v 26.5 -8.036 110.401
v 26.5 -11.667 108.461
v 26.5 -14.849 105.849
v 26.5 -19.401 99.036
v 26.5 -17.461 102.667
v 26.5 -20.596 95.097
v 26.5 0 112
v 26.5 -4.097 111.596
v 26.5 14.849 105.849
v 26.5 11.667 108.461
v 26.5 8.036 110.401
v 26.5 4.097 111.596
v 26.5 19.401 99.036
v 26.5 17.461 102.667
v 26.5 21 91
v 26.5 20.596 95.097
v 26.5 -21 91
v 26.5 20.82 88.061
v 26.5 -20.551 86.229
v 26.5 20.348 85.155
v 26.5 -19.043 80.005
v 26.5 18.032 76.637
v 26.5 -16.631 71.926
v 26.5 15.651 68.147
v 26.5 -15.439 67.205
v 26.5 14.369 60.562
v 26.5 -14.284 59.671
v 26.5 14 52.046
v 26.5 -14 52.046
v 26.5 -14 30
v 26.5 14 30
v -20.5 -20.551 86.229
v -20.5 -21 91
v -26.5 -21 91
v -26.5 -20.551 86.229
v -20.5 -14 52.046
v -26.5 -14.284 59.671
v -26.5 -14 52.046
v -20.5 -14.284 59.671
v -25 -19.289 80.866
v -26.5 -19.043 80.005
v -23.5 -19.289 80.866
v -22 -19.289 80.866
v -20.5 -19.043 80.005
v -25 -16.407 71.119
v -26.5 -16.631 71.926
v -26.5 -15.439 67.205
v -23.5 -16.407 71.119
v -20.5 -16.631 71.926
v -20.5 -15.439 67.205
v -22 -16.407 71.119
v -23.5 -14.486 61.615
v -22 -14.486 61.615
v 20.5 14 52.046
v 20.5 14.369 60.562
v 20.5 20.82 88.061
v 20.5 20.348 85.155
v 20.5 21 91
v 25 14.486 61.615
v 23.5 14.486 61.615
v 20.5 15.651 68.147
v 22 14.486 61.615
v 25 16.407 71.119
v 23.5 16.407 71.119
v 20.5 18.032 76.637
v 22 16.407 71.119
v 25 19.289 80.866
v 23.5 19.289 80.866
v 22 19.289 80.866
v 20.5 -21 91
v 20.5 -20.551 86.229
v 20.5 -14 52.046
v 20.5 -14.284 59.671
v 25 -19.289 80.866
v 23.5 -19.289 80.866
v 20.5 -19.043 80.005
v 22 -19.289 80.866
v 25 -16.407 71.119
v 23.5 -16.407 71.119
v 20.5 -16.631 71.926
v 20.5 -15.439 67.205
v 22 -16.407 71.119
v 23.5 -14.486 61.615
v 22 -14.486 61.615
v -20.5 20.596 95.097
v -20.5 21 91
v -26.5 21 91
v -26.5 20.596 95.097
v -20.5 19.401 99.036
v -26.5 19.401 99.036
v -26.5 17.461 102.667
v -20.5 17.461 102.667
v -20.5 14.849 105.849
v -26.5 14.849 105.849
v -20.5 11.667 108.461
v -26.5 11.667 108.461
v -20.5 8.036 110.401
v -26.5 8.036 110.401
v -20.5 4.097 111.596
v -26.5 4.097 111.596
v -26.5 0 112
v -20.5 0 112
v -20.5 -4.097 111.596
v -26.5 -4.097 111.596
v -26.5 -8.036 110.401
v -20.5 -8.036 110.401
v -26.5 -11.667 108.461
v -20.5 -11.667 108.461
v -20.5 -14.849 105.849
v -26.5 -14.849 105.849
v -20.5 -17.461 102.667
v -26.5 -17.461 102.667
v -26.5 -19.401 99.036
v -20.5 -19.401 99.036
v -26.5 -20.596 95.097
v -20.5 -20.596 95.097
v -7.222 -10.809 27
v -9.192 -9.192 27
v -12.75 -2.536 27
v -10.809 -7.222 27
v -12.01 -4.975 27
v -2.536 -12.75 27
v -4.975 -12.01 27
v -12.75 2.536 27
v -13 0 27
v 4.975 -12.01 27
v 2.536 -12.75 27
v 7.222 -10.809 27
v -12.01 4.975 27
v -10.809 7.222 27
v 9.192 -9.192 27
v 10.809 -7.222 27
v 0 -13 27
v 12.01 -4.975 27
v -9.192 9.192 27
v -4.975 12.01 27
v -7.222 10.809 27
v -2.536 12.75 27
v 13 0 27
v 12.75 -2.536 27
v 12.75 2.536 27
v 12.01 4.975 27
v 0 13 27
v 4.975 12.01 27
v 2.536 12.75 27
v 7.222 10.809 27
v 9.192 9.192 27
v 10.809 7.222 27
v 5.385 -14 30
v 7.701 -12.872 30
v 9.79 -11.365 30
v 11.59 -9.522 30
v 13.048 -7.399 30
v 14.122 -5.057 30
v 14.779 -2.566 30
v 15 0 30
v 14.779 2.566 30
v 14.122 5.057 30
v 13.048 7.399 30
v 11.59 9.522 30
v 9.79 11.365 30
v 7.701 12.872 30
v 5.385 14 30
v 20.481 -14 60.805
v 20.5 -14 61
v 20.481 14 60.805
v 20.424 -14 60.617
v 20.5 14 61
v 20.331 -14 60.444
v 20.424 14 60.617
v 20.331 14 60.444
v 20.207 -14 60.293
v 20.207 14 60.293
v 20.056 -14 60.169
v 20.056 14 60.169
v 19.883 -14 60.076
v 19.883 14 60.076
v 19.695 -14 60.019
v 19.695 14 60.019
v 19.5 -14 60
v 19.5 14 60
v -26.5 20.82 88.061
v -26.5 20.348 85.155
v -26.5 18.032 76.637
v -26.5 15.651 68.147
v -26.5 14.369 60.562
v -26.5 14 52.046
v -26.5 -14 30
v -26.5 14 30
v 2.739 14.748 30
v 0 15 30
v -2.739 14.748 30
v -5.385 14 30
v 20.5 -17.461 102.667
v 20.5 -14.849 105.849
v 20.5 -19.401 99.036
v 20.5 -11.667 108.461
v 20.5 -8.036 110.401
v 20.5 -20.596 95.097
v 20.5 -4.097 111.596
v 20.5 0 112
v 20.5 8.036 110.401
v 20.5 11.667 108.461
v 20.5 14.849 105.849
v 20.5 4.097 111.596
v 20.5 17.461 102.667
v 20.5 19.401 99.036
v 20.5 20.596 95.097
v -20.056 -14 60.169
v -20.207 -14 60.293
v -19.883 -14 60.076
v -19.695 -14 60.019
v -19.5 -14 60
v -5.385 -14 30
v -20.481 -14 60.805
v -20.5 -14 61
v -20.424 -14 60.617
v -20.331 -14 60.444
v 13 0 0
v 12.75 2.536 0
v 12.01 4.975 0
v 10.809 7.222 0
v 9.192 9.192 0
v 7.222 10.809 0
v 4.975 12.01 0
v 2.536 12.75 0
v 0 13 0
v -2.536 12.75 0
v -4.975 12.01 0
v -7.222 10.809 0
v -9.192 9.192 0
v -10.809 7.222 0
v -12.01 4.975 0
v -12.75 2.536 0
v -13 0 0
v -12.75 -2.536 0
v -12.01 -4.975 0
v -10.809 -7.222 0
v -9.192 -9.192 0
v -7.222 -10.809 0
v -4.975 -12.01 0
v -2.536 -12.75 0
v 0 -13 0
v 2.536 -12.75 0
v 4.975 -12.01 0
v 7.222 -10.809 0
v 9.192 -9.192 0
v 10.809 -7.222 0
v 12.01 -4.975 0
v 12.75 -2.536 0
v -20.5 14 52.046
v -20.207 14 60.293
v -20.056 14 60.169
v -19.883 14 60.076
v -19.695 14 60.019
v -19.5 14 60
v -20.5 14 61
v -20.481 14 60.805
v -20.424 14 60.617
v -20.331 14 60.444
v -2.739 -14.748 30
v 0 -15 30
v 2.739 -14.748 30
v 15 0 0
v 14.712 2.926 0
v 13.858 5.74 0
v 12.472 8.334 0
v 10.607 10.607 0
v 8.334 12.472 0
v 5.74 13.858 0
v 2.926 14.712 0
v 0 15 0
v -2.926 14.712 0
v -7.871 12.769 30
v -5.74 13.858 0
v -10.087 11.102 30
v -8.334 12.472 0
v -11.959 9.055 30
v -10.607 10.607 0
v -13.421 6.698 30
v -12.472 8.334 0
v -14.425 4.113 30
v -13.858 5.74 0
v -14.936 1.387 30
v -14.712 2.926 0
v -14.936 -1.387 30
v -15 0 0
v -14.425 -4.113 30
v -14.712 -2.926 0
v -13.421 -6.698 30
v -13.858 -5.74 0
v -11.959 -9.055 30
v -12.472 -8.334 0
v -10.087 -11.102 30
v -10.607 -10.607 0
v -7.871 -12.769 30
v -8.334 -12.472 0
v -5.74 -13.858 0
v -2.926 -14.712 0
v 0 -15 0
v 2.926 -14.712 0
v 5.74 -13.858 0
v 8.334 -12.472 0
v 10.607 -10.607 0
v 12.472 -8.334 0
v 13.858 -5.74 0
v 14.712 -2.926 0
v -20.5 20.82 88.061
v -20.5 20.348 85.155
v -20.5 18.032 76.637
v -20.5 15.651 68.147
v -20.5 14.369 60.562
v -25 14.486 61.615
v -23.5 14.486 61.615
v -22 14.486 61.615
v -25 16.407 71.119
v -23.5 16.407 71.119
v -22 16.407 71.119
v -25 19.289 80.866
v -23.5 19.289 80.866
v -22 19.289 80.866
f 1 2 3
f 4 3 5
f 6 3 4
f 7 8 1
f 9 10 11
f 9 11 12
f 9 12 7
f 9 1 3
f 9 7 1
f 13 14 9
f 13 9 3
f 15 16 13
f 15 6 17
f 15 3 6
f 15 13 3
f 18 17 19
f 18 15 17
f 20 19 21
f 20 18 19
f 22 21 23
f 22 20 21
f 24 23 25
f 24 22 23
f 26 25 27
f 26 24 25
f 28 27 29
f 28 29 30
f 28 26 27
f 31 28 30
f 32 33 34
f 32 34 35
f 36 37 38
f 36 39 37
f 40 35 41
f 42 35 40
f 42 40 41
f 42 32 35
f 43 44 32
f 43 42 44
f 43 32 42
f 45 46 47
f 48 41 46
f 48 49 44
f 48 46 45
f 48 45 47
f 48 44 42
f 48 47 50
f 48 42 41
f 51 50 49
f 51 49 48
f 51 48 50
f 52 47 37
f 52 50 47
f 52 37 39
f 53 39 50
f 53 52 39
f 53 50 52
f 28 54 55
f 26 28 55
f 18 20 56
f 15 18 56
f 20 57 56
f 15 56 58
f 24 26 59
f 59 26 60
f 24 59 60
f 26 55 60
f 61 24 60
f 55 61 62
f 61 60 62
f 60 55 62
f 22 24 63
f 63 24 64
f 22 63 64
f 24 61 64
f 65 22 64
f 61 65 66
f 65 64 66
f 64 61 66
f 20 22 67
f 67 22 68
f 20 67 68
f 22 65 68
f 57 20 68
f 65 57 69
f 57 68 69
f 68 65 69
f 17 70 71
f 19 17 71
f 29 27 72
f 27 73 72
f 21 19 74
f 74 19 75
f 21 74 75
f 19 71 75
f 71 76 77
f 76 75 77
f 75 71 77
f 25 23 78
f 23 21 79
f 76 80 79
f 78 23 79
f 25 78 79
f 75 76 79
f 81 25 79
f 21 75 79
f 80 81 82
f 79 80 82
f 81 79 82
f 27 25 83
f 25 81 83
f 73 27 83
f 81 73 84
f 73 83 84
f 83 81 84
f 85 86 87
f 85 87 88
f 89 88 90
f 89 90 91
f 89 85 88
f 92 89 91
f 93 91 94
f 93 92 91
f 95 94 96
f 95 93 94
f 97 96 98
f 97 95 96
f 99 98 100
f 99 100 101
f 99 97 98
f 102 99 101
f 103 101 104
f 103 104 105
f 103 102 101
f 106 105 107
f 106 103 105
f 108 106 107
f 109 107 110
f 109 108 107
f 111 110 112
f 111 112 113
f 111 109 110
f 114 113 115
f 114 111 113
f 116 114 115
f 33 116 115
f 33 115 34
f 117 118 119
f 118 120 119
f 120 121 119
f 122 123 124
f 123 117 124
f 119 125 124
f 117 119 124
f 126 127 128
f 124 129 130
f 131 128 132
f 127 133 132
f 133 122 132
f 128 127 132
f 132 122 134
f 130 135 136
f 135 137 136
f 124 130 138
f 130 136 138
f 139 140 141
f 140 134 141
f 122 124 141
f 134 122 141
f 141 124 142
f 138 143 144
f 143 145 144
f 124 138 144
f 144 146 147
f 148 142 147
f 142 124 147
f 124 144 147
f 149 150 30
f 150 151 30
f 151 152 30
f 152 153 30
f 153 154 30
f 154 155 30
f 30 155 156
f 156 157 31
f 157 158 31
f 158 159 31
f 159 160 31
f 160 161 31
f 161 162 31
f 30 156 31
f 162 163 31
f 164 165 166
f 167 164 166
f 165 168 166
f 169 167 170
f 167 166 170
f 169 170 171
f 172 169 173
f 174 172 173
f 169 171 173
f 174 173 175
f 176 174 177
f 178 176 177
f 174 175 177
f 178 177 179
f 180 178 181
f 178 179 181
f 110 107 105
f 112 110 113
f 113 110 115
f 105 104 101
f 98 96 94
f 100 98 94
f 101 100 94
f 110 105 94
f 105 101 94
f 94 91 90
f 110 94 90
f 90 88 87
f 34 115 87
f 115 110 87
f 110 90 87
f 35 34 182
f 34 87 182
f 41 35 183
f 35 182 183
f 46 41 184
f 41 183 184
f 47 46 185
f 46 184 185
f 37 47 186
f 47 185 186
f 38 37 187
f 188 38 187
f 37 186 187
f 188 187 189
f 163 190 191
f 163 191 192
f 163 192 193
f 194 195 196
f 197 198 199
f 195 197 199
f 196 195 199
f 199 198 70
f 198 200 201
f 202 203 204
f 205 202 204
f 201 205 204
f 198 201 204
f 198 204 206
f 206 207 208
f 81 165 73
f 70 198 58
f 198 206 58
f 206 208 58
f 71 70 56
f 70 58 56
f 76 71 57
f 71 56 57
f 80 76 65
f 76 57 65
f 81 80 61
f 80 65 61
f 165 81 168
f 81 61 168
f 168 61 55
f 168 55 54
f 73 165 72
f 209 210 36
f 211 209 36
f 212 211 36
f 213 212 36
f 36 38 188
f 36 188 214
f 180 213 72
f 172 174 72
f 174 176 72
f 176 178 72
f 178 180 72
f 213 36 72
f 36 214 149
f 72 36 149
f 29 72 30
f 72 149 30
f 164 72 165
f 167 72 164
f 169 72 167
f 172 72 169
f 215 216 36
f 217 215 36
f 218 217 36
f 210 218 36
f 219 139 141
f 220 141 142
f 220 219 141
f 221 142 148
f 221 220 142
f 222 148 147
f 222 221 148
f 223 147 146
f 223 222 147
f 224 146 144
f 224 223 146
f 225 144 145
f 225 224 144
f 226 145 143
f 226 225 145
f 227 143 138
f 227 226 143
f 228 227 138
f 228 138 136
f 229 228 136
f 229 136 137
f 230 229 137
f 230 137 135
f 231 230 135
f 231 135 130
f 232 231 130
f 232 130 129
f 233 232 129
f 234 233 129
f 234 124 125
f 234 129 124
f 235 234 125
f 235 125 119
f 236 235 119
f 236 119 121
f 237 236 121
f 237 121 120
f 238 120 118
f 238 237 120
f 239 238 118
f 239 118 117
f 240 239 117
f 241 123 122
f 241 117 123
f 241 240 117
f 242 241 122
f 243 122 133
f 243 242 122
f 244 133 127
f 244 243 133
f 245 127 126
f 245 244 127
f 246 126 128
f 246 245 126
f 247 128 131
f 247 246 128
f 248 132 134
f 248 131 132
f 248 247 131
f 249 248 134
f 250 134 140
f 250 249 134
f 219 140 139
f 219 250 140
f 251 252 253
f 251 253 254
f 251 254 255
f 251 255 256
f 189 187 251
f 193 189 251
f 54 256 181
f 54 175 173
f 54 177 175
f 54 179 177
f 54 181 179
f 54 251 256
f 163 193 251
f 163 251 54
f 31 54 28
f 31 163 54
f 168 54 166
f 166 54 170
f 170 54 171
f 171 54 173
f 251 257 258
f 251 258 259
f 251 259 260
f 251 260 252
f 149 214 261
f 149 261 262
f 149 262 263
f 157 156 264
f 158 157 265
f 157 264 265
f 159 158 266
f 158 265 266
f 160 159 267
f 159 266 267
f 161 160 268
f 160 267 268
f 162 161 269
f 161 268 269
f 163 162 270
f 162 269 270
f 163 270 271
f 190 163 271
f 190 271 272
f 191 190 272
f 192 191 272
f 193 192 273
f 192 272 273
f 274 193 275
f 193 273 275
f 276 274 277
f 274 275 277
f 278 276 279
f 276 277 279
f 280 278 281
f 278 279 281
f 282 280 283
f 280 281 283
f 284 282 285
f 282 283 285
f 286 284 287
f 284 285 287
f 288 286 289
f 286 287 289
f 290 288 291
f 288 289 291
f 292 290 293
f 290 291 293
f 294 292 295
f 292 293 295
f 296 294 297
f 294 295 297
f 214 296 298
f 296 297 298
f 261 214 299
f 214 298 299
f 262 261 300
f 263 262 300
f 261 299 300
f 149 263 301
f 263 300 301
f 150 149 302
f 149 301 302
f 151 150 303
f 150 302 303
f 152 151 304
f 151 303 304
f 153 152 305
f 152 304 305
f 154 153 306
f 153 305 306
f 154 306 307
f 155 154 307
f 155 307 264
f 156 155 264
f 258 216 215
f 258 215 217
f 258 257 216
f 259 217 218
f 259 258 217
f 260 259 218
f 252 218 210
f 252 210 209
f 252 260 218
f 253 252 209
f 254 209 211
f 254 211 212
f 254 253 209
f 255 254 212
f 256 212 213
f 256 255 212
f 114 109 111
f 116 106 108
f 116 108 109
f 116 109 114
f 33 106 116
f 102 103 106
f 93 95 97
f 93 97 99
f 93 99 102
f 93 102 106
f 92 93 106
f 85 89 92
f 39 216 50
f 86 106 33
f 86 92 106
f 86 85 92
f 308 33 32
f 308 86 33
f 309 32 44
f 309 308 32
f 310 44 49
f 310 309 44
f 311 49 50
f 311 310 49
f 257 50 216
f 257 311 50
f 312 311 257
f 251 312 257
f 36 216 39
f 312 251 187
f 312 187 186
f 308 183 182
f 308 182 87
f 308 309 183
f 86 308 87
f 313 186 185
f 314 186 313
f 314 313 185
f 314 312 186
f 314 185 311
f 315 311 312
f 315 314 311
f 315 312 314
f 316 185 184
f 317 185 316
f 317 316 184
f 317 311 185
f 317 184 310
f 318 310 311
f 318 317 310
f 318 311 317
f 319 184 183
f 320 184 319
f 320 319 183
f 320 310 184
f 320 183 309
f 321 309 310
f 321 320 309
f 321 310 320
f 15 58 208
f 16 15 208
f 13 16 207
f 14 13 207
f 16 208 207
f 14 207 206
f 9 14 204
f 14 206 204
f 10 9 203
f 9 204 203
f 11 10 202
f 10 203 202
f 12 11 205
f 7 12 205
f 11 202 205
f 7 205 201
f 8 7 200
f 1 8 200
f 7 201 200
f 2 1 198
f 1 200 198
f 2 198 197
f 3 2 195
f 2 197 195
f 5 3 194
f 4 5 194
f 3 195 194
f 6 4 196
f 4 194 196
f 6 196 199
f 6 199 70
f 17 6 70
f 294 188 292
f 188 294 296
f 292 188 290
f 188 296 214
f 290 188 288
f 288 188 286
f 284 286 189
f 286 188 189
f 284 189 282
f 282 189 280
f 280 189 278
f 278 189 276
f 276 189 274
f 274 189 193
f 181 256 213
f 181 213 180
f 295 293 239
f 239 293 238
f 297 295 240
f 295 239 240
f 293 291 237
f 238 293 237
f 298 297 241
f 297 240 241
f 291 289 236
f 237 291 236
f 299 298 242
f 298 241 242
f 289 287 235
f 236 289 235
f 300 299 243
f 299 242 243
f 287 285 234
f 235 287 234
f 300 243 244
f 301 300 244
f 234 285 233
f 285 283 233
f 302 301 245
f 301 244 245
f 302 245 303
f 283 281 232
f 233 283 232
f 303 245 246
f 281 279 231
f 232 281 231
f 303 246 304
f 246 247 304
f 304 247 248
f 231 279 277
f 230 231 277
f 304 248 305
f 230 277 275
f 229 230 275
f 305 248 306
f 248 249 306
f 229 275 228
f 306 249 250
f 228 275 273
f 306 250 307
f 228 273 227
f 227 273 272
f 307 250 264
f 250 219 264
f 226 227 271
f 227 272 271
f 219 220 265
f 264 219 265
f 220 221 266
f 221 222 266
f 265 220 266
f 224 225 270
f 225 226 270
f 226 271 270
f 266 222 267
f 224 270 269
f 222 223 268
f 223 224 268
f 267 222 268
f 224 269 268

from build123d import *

# Parameters (mm, degrees)
SKETCH1_R           = 15
SKETCH1_R_2         = 13
BOSS_EXTRUDE1_DEPTH = 30
BOSS_EXTRUDE2_START = -3
SKETCH2_R           = 15
BOSS_EXTRUDE2_DEPTH = 3
SKETCH3_W           = 53
SKETCH3_H           = 28
BOSS_EXTRUDE3_DEPTH = 30
BOSS_EXTRUDE5_START = -6
BOSS_EXTRUDE5_DEPTH = 6
FILLET1_R           = 1


# Read off the part's stored shape, not the designer's step: Boss-Extrude5
with BuildPart() as part:
    # Sketch1 → Boss-Extrude1 (new body)
    with BuildSketch(Plane.XY):
        Circle(SKETCH1_R)
        Circle(SKETCH1_R_2, mode=Mode.SUBTRACT)
    extrude(amount=BOSS_EXTRUDE1_DEPTH)

    # Sketch2 → Boss-Extrude2 (add)
    with BuildSketch(Plane.XY.offset(30).offset(BOSS_EXTRUDE2_START)):
        Circle(SKETCH2_R)
    extrude(amount=BOSS_EXTRUDE2_DEPTH)

    # Sketch3 → Boss-Extrude3 (add)
    with BuildSketch(Plane.XY.offset(30)):
        Rectangle(SKETCH3_W, SKETCH3_H)
    extrude(amount=BOSS_EXTRUDE3_DEPTH)

    # Boss-Extrude5 outline → Boss-Extrude5 (add)
    with BuildSketch(Plane(origin=(26.5, 0, 0), x_dir=(0, 0, -1), z_dir=(1, 0, 0)).offset(BOSS_EXTRUDE5_START)):
        with BuildLine():
            Line((-60, 14), (-52.045674019, 14))
            add(Edge.make_bspline(
                [(-52.045674019, 14), (-61.791651738, 14.026298499), (-70.837462314, 14.567622964), (-80.6660896, 21), (-91, 21)],
                knots=[0.062270869, 0.062270869, 0.062270869, 0.062270869, 0.062270869, 1, 1, 1, 1, 1], degree=4))
            ThreePointArc((-91, 21), (-112, 0), (-91, -21))
            add(Edge.make_bspline(
                [(-91, -21), (-80.6660896, -21), (-70.837462314, -14.567622964), (-61.791651738, -14.026298499), (-52.045674019, -14)],
                knots=[0, 0, 0, 0, 0, 0.937729131, 0.937729131, 0.937729131, 0.937729131, 0.937729131], degree=4))
            Line((-52.045674019, -14), (-60, -14))
            Line((-60, -14), (-60, 14))
        make_face()
    boss_extrude5 = extrude(amount=BOSS_EXTRUDE5_DEPTH)

    # Mirror1: Boss-Extrude5 across plane
    add(boss_extrude5.mirror(Plane(origin=(0, 0, 0), x_dir=(0, 0, 1), z_dir=(1, 0, 0))))

    # Fillet1
    fillet1_edges = [part.edges().sort_by_distance(p)[0] for p in [
        (20.5, 0, 60),
        (-20.5, 0, 60),
    ]]
    fillet(fillet1_edges, radius=FILLET1_R)


solid = part.part
